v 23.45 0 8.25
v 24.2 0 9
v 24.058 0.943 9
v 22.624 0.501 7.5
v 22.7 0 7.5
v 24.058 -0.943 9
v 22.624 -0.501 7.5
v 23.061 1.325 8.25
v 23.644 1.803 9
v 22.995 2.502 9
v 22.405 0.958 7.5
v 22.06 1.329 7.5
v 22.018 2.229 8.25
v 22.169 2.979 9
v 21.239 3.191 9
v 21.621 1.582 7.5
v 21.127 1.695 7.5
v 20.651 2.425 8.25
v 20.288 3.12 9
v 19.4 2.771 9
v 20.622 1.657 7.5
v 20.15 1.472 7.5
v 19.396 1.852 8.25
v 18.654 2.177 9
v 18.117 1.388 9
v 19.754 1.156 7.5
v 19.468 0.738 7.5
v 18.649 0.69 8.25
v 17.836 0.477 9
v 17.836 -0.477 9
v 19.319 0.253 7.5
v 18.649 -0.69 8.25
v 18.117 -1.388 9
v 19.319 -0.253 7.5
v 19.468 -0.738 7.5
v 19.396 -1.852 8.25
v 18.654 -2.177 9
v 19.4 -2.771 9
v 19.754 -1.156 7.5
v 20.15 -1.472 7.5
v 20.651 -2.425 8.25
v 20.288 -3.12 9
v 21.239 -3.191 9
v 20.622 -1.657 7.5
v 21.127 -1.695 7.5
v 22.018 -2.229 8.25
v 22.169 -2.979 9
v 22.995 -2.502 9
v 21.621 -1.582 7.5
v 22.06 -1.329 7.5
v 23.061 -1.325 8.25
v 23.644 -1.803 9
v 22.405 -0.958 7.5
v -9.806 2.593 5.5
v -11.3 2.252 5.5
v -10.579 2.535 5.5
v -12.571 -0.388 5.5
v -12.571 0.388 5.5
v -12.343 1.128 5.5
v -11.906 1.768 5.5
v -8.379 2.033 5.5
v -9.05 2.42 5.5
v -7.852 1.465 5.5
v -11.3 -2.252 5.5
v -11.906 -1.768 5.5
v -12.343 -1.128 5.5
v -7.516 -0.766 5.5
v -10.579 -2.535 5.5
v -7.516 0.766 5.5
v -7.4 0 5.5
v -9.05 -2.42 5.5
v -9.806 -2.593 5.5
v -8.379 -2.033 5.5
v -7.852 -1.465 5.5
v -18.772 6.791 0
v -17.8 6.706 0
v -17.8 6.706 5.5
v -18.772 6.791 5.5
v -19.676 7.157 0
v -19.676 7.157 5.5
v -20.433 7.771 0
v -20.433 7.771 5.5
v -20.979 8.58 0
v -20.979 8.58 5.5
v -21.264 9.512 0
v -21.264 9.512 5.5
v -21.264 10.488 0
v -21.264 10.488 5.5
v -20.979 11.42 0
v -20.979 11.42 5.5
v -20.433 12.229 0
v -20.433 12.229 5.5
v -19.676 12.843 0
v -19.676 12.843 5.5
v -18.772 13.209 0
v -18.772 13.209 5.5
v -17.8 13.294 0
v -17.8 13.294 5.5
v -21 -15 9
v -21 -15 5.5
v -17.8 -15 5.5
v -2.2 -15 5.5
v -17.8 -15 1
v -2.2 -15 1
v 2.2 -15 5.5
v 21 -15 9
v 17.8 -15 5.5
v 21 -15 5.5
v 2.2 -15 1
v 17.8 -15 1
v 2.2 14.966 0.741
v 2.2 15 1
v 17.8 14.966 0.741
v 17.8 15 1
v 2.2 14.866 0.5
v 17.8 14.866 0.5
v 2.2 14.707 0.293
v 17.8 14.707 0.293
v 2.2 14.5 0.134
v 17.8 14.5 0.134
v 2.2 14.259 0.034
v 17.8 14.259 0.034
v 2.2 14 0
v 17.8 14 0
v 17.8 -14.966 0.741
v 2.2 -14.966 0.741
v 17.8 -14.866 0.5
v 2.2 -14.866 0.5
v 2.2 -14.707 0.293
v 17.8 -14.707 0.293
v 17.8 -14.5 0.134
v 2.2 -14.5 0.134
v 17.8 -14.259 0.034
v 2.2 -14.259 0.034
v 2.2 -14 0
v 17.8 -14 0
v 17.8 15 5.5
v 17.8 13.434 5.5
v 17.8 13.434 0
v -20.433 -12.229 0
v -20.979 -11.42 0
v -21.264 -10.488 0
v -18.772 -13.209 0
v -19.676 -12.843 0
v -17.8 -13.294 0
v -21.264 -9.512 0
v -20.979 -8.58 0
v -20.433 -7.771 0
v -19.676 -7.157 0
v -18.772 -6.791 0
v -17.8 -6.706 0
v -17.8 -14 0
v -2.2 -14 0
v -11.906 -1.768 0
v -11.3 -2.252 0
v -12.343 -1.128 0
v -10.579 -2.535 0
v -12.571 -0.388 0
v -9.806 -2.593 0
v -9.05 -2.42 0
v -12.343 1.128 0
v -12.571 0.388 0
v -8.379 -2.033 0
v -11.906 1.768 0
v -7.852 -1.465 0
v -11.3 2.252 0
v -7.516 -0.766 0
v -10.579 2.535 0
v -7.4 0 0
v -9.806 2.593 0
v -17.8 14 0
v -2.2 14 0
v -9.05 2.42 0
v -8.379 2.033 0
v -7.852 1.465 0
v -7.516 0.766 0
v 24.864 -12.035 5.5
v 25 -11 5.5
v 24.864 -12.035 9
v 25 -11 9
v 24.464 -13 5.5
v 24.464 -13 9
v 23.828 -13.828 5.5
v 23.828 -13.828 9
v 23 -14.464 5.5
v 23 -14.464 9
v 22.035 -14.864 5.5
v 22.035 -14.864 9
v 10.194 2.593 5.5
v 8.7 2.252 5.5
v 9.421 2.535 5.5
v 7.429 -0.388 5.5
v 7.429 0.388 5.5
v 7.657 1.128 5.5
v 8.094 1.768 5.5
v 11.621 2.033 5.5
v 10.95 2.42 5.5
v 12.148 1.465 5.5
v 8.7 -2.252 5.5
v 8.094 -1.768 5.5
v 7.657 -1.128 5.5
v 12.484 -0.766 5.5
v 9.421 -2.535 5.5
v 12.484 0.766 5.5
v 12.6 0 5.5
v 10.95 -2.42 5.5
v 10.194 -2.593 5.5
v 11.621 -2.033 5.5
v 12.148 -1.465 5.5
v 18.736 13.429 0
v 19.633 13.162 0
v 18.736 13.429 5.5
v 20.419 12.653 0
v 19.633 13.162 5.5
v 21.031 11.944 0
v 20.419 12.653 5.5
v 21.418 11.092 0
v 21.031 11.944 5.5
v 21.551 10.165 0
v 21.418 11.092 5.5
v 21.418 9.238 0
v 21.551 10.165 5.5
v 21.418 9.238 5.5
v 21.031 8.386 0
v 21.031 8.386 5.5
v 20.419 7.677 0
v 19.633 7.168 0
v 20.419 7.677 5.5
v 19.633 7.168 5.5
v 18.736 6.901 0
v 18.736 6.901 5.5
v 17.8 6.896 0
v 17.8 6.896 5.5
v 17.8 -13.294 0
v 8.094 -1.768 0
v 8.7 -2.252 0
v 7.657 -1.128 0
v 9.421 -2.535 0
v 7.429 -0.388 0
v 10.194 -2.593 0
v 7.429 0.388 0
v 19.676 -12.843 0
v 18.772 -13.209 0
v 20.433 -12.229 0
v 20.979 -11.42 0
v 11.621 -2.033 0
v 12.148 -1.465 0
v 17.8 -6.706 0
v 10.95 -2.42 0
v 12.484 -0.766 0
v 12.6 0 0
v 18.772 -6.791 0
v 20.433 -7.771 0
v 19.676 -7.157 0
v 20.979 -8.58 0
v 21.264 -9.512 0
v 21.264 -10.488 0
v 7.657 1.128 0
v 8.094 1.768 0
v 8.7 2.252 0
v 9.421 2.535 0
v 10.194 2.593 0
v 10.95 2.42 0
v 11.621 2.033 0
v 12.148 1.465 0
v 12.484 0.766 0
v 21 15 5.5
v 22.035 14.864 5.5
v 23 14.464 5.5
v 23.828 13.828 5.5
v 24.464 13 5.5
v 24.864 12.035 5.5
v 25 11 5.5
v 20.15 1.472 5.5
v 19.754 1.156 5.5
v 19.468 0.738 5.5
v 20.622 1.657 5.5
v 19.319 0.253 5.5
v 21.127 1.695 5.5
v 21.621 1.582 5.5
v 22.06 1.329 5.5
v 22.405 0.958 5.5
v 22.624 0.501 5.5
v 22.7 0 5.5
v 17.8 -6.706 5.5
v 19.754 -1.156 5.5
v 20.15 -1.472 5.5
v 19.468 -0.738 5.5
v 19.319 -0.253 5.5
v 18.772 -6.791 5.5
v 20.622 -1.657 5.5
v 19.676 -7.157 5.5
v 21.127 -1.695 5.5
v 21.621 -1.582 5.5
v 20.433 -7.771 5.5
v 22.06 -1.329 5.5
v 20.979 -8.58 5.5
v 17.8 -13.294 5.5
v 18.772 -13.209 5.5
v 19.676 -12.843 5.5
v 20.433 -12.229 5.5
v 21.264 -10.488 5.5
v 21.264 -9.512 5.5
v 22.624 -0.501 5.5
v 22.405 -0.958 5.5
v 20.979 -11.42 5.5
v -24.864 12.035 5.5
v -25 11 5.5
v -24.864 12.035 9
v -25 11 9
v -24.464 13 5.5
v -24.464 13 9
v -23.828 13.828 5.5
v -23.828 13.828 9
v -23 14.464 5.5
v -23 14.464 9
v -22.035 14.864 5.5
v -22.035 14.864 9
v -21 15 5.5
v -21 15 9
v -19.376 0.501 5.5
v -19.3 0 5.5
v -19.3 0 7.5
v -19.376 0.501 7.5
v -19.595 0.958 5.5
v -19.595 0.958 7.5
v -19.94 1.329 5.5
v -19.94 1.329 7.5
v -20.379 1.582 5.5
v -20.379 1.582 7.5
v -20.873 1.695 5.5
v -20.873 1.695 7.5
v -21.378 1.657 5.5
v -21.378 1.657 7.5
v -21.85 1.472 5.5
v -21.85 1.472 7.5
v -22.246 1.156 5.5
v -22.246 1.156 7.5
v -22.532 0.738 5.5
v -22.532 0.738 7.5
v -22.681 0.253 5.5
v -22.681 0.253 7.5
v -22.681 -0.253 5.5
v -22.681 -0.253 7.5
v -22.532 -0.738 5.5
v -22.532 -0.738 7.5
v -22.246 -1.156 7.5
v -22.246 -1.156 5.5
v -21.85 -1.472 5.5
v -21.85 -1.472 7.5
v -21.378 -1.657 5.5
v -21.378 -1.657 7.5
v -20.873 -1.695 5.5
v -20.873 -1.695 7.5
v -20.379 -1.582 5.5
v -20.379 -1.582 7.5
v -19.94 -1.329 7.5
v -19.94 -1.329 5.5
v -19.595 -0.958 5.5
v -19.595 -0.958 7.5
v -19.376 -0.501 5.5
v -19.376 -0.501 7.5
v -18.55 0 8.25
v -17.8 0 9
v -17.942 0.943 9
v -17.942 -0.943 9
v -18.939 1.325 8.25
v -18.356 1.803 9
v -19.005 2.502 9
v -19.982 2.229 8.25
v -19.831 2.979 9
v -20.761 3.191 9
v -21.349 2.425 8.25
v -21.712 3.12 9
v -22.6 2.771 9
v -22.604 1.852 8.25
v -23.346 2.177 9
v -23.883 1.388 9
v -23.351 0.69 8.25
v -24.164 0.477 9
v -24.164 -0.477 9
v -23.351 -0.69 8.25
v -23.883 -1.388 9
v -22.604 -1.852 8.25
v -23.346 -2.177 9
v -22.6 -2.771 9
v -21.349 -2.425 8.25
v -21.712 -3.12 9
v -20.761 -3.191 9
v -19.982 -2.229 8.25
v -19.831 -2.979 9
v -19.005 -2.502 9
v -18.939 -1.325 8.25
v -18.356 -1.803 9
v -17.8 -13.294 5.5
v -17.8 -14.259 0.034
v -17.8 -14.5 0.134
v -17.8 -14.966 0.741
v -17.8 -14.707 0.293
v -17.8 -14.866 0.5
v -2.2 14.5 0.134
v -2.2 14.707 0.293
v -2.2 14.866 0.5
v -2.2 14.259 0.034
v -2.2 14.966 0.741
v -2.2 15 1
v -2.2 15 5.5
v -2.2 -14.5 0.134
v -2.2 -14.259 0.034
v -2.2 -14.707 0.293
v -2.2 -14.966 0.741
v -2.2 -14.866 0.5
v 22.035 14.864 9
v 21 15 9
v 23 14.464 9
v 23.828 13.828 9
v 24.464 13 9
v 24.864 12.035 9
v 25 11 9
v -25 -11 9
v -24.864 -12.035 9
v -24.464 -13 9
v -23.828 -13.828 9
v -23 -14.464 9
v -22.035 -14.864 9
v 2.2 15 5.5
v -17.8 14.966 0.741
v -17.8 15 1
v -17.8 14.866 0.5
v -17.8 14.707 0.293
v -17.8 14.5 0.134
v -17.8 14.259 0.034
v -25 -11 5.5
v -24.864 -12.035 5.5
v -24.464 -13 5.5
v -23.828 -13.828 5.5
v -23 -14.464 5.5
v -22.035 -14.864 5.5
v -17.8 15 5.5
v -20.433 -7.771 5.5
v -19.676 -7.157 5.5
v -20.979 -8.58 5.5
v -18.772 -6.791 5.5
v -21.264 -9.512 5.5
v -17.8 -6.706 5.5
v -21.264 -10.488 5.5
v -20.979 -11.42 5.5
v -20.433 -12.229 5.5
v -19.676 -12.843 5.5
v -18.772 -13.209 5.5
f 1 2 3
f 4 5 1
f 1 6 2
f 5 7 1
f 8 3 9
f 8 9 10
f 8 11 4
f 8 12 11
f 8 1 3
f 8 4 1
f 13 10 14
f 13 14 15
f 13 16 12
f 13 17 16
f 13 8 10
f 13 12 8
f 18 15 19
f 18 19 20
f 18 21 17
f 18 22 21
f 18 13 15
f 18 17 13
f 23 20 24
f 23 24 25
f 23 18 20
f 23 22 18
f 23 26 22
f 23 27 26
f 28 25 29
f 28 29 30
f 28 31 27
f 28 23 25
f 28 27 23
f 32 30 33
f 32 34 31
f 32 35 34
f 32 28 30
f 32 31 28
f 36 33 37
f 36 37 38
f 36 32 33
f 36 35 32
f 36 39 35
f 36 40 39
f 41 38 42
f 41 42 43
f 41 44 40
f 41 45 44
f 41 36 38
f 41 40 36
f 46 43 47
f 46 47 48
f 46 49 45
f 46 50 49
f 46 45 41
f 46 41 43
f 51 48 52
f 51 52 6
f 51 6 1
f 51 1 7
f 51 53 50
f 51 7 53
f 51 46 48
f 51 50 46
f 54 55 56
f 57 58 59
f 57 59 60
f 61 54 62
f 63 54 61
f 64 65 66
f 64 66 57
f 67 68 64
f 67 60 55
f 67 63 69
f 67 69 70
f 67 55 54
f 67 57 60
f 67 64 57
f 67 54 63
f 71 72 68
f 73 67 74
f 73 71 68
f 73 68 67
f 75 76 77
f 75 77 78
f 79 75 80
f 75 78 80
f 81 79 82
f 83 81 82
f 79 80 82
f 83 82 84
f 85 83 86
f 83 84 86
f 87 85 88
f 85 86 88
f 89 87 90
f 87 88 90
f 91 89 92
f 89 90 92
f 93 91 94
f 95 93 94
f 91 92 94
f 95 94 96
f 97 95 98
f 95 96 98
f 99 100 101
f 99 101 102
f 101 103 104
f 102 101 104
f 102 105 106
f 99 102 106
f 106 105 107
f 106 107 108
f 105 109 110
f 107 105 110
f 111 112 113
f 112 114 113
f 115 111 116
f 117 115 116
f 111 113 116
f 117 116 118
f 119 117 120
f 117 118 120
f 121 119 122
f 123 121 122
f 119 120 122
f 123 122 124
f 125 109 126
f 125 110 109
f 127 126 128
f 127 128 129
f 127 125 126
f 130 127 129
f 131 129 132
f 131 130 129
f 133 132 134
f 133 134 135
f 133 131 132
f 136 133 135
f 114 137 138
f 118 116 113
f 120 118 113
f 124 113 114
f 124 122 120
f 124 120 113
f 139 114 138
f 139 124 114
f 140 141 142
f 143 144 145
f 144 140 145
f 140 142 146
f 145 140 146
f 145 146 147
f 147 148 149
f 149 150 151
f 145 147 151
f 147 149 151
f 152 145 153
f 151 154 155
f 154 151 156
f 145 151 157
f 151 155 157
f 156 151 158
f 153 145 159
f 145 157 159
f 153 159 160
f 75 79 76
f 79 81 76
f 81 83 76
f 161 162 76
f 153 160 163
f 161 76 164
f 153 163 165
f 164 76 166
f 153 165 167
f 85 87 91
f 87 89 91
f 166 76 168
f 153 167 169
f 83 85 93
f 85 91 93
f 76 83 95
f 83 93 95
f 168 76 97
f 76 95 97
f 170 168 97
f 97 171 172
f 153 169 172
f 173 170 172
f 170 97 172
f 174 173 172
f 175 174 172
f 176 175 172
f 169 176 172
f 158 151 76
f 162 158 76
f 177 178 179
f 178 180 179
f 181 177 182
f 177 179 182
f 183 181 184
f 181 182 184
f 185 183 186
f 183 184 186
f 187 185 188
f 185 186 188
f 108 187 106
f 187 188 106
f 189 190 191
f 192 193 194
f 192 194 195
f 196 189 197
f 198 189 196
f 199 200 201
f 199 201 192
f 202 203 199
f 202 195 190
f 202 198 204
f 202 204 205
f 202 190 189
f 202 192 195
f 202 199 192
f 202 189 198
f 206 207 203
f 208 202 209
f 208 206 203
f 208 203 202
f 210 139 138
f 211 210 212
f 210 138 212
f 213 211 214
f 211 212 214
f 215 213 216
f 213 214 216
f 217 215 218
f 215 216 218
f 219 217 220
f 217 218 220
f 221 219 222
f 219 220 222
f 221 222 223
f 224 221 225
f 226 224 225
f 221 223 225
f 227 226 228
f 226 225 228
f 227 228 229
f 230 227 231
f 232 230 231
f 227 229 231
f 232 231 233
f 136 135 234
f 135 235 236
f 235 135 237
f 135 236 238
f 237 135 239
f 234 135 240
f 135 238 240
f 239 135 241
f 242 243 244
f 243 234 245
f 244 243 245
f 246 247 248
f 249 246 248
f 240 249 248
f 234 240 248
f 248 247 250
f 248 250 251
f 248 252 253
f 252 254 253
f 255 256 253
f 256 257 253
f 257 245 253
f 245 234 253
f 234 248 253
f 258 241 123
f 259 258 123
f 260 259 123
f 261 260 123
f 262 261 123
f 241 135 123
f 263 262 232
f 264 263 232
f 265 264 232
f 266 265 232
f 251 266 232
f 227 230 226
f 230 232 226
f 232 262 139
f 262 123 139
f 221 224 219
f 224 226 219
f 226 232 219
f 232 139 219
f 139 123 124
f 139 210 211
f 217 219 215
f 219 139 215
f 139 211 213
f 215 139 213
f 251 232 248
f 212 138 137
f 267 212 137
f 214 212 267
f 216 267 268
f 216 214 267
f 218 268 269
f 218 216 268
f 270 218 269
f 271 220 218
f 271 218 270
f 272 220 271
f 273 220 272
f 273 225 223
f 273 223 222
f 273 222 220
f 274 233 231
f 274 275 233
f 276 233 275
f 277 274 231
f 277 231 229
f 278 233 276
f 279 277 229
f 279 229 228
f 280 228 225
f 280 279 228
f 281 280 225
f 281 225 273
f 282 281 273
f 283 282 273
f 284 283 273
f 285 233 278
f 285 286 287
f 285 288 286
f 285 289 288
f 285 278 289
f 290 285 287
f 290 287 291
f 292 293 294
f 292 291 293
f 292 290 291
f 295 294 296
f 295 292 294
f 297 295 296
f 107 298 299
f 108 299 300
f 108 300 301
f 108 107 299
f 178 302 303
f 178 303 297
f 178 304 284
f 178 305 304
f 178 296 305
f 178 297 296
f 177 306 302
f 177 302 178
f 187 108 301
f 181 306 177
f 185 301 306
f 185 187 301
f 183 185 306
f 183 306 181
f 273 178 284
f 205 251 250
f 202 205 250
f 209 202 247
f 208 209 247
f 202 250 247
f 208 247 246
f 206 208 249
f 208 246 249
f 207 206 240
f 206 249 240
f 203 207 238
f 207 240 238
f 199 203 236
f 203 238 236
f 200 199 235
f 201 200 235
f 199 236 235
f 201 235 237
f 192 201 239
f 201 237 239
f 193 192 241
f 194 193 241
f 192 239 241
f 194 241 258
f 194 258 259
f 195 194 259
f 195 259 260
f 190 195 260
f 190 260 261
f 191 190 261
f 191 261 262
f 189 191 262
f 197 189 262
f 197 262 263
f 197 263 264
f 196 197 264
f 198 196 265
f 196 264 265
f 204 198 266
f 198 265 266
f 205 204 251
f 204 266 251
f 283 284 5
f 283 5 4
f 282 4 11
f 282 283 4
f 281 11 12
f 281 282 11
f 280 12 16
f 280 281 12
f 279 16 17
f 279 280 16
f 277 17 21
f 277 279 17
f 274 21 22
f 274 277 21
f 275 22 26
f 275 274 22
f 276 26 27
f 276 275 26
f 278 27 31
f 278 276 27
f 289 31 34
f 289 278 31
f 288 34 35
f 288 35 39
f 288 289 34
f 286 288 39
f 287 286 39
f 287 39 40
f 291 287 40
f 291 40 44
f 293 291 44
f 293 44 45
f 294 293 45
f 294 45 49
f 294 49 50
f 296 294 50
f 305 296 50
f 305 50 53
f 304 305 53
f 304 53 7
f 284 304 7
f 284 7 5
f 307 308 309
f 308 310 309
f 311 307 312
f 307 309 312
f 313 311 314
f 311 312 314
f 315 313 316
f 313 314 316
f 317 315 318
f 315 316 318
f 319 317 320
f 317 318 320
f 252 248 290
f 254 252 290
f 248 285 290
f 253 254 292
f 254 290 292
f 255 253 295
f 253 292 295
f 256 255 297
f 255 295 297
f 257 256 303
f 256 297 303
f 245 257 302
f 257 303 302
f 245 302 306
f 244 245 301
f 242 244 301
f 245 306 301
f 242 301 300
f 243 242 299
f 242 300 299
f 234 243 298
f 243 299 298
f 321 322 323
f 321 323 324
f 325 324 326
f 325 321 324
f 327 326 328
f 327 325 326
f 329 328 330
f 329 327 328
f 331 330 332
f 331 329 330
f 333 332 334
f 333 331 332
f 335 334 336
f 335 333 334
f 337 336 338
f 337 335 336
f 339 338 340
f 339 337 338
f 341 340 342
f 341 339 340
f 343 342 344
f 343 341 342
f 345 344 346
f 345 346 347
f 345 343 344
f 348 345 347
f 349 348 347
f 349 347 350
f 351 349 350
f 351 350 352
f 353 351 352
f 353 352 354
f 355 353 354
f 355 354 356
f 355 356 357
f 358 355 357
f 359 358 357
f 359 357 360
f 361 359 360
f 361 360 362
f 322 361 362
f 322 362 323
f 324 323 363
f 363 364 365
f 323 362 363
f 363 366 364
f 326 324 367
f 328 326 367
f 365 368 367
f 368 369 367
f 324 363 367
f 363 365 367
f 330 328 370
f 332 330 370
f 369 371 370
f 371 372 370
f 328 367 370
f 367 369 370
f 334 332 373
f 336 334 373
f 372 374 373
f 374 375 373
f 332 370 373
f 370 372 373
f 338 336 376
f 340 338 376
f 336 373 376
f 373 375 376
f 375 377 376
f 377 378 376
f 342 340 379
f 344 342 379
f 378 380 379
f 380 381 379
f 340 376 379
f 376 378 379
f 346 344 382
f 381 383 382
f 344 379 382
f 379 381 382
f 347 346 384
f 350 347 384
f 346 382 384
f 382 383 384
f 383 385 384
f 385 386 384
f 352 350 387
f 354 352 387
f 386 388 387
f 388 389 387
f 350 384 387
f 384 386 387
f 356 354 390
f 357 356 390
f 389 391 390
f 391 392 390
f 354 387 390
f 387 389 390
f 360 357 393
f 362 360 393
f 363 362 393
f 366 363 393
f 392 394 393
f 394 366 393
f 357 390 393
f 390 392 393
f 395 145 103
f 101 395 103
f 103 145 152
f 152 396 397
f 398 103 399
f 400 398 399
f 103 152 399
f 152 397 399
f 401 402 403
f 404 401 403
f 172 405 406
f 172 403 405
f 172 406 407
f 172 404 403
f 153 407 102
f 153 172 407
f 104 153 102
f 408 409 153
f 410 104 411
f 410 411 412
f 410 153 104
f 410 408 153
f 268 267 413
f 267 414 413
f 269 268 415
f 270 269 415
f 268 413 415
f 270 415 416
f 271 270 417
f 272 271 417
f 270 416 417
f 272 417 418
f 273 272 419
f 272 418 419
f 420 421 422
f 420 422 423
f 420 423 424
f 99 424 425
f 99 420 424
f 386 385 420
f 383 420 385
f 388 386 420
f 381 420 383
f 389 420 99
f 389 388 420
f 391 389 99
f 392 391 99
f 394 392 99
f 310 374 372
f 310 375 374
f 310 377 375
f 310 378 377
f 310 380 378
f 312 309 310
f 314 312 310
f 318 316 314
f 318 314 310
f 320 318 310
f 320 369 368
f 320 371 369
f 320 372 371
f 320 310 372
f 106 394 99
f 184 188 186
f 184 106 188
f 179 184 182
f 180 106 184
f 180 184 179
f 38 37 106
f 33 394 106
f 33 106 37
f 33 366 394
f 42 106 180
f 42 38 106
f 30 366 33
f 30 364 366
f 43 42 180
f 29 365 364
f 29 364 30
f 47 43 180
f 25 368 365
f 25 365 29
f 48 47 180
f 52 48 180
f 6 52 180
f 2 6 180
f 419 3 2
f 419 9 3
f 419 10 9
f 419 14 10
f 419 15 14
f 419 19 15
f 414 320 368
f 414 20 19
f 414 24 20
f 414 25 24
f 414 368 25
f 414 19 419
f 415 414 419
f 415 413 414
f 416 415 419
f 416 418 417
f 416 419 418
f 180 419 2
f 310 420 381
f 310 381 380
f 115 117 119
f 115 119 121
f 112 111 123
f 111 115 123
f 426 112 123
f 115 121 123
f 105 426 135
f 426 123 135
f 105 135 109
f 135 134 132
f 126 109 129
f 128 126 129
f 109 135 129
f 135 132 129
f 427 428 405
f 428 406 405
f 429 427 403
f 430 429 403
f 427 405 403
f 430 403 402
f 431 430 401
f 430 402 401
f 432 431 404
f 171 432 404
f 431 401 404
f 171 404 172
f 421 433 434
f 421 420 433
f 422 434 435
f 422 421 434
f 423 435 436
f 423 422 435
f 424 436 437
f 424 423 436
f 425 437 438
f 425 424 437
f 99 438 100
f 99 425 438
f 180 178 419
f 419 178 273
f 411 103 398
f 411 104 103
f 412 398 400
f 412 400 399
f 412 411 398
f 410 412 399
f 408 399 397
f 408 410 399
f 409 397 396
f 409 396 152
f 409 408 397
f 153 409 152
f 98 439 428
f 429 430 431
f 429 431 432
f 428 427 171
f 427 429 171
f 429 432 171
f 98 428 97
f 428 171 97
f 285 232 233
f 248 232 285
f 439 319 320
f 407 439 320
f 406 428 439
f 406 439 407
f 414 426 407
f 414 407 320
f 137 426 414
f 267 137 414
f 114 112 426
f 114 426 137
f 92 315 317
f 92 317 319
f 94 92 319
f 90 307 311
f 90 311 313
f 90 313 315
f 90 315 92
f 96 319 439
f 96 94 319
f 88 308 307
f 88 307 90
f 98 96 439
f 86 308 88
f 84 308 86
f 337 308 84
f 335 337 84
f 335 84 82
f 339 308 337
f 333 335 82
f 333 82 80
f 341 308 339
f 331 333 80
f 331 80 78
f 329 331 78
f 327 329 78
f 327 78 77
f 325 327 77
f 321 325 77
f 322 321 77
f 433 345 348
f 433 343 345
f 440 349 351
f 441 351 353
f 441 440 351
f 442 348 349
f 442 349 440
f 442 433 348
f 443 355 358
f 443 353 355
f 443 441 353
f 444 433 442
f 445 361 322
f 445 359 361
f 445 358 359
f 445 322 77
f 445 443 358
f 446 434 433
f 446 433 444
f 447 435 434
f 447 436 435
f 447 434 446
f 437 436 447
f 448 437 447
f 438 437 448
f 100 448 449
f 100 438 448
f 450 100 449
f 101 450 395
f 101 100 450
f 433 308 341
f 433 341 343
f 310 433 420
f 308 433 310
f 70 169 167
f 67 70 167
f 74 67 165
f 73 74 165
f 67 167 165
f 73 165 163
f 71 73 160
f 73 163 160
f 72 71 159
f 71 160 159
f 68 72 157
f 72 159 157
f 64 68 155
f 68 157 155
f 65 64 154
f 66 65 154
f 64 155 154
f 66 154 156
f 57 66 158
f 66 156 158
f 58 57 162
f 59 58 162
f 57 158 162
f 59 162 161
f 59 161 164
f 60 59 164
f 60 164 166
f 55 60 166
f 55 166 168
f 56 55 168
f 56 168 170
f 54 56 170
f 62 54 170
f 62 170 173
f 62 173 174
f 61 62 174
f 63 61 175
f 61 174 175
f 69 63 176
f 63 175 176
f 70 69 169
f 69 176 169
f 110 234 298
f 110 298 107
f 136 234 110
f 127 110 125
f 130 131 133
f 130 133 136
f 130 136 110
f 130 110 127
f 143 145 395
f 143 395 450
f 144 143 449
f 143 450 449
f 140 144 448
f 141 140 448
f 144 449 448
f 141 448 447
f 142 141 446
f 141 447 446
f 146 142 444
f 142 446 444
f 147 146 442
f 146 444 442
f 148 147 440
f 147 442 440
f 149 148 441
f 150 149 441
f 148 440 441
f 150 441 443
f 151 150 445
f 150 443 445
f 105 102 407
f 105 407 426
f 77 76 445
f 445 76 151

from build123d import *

# Parameters (mm, degrees)
SKETCH_W        = 50
SKETCH_H        = 30
SKETCH_R        = 1.7
PAD_DEPTH       = 9
CHAMFER_SIZE    = 1.5
CHAMFER001_SIZE = 1.5
SKETCH001_R     = 2.6
SKETCH001_W     = 4.4
SKETCH001_H     = 32
SKETCH001_W_2   = 8.2
POCKET_DEPTH    = 5.5
FILLET_R        = 4
FILLET001_R     = 4
FILLET002_R     = 4
FILLET003_R     = 4
FILLET004_R     = 1
FILLET005_R     = 1
FILLET006_R     = 1
FILLET007_R     = 1
SKETCH004_R     = 3.3
PAD001_DEPTH    = 5.5


with BuildPart() as part:
    # Sketch → Pad (new body)
    with BuildSketch(Plane.XY):
        Rectangle(SKETCH_W, SKETCH_H)
        with Locations((-21, 0)):
            Circle(SKETCH_R, mode=Mode.SUBTRACT)
        with Locations((21, 0)):
            Circle(SKETCH_R, mode=Mode.SUBTRACT)
    extrude(amount=PAD_DEPTH)

    # Chamfer
    chamfer_edges = [part.edges().sort_by_distance(p)[0] for p in [
        (-22.7, 0, 9),
    ]]
    chamfer(chamfer_edges, length=CHAMFER_SIZE)

    # Chamfer001
    chamfer001_edges = [part.edges().sort_by_distance(p)[0] for p in [
        (19.3, 0, 9),
    ]]
    chamfer(chamfer001_edges, length=CHAMFER001_SIZE)

    # Sketch001 → Pocket (cut)
    with BuildSketch(Plane(origin=(0, 0, 0), x_dir=(1, 0, 0), z_dir=(0, 0, -1))):
        with Locations((-10, 0)):
            Circle(SKETCH001_R)
        with Locations((10, 0)):
            Circle(SKETCH001_R)
        Rectangle(SKETCH001_W, SKETCH001_H)
        with Locations((-21.9, 0)):
            Rectangle(SKETCH001_W_2, SKETCH001_H)
        with Locations((21.9, 0)):
            Rectangle(SKETCH001_W_2, SKETCH001_H)
    extrude(amount=-POCKET_DEPTH, mode=Mode.SUBTRACT)

    # Fillet
    fillet_edges = [part.edges().sort_by_distance(p)[0] for p in [
        (-25, -15, 7.25),
    ]]
    fillet(fillet_edges, radius=FILLET_R)

    # Fillet001
    fillet001_edges = [part.edges().sort_by_distance(p)[0] for p in [
        (-25, 15, 7.25),
    ]]
    fillet(fillet001_edges, radius=FILLET001_R)

    # Fillet002
    fillet002_edges = [part.edges().sort_by_distance(p)[0] for p in [
        (25, 15, 7.25),
    ]]
    fillet(fillet002_edges, radius=FILLET002_R)

    # Fillet003
    fillet003_edges = [part.edges().sort_by_distance(p)[0] for p in [
        (25, -15, 7.25),
    ]]
    fillet(fillet003_edges, radius=FILLET003_R)

    # Fillet004
    fillet004_edges = [part.edges().sort_by_distance(p)[0] for p in [
        (-10, 15, 0),
    ]]
    fillet(fillet004_edges, radius=FILLET004_R)

    # Fillet005
    fillet005_edges = [part.edges().sort_by_distance(p)[0] for p in [
        (10, 15, 0),
    ]]
    fillet(fillet005_edges, radius=FILLET005_R)

    # Fillet006
    fillet006_edges = [part.edges().sort_by_distance(p)[0] for p in [
        (-10, -15, 0),
    ]]
    fillet(fillet006_edges, radius=FILLET006_R)

    # Fillet007
    fillet007_edges = [part.edges().sort_by_distance(p)[0] for p in [
        (10, -15, 0),
    ]]
    fillet(fillet007_edges, radius=FILLET007_R)

    # Sketch004 → Pad001 (new body)
    with BuildSketch(Plane(origin=(0, 0, 5.5), x_dir=(1, 0, 0), z_dir=(0, 0, -1))):
        with Locations((-18, 10)):
            Circle(SKETCH004_R)
        with Locations((18, 10)):
            Circle(SKETCH004_R)
        with Locations((-18, -10)):
            Circle(SKETCH004_R)
        with Locations((18.251301, -10.165039)):
            Circle(SKETCH004_R)
    extrude(amount=PAD001_DEPTH)


solid = part.part
